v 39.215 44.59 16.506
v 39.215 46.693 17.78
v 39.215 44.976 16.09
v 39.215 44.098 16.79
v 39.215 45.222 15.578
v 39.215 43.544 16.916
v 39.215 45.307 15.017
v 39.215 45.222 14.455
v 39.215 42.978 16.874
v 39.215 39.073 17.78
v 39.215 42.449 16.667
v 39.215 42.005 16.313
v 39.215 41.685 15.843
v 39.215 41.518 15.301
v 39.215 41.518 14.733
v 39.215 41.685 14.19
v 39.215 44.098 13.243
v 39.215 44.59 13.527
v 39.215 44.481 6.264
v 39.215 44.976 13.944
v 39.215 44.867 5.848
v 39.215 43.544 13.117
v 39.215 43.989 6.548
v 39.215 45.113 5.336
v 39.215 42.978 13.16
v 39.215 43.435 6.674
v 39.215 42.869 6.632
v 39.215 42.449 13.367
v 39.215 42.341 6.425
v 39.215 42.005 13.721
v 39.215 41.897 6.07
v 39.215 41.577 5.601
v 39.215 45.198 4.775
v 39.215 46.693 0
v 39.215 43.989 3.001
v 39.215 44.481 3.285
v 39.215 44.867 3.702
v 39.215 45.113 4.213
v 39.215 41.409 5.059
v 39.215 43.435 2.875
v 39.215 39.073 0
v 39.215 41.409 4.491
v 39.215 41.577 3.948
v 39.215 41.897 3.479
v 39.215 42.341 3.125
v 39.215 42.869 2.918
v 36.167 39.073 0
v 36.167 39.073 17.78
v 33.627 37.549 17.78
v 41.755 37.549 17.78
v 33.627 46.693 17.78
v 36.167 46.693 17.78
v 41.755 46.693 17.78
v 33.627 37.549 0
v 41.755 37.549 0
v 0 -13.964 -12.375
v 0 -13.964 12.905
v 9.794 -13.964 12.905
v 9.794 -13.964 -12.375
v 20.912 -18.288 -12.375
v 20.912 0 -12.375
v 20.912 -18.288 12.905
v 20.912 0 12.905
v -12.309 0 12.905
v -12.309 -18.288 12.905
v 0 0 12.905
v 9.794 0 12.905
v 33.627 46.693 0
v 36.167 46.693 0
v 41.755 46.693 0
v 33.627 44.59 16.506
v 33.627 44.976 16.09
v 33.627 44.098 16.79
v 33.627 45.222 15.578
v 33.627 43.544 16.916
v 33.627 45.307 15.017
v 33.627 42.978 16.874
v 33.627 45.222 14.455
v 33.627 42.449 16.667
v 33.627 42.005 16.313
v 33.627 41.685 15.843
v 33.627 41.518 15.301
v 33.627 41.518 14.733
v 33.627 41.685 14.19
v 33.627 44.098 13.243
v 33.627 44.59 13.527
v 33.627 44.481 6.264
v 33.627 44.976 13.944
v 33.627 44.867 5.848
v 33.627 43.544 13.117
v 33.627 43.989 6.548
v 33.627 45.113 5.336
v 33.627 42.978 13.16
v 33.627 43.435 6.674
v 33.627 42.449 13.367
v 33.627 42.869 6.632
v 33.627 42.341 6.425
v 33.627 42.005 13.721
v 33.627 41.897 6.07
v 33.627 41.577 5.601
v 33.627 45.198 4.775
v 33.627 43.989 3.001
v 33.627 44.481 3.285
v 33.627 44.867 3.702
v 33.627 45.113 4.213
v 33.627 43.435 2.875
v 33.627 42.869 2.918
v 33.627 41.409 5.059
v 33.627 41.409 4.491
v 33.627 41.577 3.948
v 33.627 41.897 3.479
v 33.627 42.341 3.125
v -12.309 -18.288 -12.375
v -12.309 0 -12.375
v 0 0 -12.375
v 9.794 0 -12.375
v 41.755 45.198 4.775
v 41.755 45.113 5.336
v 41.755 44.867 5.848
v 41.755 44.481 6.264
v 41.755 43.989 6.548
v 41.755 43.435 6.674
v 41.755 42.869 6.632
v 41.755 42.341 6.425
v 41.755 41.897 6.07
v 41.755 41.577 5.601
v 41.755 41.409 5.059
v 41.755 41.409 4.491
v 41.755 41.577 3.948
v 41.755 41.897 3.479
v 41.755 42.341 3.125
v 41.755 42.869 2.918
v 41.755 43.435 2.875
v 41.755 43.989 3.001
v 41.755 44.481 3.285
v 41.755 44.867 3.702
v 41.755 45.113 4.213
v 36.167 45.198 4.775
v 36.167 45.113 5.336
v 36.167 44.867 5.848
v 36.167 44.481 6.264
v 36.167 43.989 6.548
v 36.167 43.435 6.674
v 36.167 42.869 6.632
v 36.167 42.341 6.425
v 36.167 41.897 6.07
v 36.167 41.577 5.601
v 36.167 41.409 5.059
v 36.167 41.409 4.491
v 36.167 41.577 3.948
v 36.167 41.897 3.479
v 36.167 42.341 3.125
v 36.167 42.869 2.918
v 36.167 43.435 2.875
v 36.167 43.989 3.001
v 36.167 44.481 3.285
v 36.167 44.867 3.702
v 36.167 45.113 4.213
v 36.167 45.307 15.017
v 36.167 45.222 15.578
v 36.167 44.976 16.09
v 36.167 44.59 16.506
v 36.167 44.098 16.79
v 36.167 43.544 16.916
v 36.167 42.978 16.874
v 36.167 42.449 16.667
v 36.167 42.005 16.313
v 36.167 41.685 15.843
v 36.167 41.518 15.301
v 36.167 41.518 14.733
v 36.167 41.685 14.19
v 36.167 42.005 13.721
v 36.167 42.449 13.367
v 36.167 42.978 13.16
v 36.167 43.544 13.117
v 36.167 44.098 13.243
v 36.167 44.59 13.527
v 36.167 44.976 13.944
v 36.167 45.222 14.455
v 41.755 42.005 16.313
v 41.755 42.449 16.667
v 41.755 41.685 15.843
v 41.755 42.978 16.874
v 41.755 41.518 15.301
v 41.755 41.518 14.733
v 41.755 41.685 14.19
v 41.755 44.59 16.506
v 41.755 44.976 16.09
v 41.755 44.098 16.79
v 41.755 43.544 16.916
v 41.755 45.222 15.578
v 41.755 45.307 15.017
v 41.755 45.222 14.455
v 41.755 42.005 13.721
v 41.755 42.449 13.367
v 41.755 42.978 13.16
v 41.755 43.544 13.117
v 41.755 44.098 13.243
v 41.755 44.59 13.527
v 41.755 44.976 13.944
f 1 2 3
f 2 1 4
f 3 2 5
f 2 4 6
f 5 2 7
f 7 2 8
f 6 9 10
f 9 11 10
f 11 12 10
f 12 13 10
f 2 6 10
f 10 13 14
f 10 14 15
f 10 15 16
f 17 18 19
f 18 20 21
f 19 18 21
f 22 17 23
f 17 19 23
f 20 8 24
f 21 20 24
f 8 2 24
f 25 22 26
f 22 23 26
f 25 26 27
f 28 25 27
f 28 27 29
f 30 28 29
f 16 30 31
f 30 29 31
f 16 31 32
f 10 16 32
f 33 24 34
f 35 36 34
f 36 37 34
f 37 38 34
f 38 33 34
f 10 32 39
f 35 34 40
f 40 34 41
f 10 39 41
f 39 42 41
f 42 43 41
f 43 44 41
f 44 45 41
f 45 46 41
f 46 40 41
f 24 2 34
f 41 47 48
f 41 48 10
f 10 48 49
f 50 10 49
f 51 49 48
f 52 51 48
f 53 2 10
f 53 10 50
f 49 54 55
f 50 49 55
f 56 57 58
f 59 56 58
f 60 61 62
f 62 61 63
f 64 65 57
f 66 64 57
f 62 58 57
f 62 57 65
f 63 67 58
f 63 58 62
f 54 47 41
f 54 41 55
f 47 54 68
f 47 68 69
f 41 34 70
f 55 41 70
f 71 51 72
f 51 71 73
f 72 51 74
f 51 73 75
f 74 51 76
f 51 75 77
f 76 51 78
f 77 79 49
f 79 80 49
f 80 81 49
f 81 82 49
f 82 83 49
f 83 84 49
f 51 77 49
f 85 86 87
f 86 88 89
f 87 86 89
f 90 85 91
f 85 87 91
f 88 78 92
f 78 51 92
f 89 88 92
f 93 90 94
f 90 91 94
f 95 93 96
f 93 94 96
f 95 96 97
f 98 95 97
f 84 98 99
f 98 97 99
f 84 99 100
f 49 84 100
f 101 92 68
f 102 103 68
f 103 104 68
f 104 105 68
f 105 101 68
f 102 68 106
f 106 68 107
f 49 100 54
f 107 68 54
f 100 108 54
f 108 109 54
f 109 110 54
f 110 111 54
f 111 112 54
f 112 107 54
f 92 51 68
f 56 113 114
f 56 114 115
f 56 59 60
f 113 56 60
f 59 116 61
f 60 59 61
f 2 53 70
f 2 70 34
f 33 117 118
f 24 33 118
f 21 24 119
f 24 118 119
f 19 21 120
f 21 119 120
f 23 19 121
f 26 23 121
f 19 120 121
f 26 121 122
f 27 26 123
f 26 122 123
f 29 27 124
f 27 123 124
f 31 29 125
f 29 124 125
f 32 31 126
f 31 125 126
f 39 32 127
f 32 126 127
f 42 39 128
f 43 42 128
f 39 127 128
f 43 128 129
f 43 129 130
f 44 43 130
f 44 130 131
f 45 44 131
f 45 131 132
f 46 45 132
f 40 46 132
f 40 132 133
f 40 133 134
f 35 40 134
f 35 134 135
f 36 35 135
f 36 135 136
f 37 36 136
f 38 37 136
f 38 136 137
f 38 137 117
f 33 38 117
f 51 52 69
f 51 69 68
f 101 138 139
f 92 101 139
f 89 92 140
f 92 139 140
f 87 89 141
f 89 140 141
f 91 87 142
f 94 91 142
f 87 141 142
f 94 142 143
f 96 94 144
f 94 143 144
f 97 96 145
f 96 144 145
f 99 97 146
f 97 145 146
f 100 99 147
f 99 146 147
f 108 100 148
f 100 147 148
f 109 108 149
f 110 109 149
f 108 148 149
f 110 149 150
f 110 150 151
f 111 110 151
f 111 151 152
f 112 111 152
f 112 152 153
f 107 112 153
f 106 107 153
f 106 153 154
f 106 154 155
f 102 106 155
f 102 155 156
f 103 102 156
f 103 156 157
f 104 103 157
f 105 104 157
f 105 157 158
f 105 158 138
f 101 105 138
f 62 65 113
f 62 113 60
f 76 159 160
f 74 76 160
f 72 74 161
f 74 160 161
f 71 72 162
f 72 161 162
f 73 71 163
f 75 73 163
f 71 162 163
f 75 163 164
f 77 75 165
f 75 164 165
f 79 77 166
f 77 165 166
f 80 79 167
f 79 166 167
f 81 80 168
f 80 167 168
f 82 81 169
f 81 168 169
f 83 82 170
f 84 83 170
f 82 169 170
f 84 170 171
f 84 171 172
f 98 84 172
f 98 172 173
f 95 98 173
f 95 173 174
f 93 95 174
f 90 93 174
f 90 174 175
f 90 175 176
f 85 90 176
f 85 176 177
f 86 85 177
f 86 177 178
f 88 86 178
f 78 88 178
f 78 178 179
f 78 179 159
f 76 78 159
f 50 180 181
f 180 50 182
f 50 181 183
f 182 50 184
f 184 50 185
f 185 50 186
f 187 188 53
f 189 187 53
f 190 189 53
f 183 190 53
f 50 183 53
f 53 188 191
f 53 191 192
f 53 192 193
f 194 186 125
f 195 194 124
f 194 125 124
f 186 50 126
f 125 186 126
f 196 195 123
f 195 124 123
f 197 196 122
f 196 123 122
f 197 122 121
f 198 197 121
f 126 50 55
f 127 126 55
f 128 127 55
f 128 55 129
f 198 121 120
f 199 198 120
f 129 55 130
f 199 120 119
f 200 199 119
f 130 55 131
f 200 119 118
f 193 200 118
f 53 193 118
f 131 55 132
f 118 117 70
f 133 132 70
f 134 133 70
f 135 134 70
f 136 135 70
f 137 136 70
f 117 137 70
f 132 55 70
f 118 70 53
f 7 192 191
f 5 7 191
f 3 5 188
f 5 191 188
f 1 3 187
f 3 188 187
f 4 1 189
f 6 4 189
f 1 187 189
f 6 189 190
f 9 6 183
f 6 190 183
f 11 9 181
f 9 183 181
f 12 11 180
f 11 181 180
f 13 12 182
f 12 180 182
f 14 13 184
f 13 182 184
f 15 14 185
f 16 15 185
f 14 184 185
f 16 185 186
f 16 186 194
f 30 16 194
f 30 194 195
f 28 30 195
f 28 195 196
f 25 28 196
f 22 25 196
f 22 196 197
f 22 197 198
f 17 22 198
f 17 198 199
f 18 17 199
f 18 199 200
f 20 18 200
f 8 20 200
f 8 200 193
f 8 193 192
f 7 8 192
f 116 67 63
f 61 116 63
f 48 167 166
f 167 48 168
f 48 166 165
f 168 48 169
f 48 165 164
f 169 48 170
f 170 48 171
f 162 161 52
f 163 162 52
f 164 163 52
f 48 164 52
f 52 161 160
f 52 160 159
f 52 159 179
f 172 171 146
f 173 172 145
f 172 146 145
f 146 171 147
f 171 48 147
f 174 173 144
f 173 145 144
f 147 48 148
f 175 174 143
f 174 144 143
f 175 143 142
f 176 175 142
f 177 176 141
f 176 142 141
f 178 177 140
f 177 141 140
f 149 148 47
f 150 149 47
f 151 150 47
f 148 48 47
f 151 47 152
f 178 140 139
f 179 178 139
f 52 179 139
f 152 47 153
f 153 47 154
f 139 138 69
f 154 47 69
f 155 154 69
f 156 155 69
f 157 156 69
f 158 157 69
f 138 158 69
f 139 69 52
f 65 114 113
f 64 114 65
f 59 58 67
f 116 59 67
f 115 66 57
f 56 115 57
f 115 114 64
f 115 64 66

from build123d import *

# Parameters (mm, degrees)
F0_W     = 33.221686
F0_H     = 25.280248
F1_DEPTH = 18.288
F3_DEPTH = 25.4
F4_W     = 3.048
F4_H     = 1.524
F5_DEPTH = 17.78
F6_R     = 1.905
F7_DEPTH = 25.4


with BuildPart() as f1:
    # F0 (on Front) → F1 (new body)
    with BuildSketch(Plane.XZ):
        with Locations((4.301612, 0.264715)):
            Rectangle(F0_W, F0_H)
    extrude(amount=F1_DEPTH)

    # F2 (on face) → F3 (cut)
    with BuildSketch(Plane.XY.offset(12.904839)):
        Polygon((9.794441, 0), (0, 0), (0, -2.580968), (0, -13.963697), (9.794441, -13.963697), align=None)
    extrude(amount=-F3_DEPTH, mode=Mode.SUBTRACT)


with BuildPart() as f5:
    # F4 (on Top) → F5 (new body)
    with BuildSketch(Plane.XY):
        Polygon((36.166562, 46.693411), (33.626562, 46.693411), (33.626562, 37.549411), (36.166562, 37.549411), (36.166562, 39.073411), align=None)
        with Locations((37.690562, 38.311411)):
            Rectangle(F4_W, F4_H)
        Polygon((39.214562, 46.693411), (39.214562, 39.073411), (39.214562, 37.549411), (41.754562, 37.549411), (41.754562, 46.693411), align=None)
    extrude(amount=F5_DEPTH)

    # F6 (on face) → F7 (cut)
    with BuildSketch(Plane.YZ.offset(41.754562)):
        with Locations((43.401804, 15.016772)):
            Circle(F6_R)
        with Locations((43.293033, 4.774769)):
            Circle(F6_R)
    extrude(amount=-F7_DEPTH, mode=Mode.SUBTRACT)


solid = Compound([f1.part, f5.part])
